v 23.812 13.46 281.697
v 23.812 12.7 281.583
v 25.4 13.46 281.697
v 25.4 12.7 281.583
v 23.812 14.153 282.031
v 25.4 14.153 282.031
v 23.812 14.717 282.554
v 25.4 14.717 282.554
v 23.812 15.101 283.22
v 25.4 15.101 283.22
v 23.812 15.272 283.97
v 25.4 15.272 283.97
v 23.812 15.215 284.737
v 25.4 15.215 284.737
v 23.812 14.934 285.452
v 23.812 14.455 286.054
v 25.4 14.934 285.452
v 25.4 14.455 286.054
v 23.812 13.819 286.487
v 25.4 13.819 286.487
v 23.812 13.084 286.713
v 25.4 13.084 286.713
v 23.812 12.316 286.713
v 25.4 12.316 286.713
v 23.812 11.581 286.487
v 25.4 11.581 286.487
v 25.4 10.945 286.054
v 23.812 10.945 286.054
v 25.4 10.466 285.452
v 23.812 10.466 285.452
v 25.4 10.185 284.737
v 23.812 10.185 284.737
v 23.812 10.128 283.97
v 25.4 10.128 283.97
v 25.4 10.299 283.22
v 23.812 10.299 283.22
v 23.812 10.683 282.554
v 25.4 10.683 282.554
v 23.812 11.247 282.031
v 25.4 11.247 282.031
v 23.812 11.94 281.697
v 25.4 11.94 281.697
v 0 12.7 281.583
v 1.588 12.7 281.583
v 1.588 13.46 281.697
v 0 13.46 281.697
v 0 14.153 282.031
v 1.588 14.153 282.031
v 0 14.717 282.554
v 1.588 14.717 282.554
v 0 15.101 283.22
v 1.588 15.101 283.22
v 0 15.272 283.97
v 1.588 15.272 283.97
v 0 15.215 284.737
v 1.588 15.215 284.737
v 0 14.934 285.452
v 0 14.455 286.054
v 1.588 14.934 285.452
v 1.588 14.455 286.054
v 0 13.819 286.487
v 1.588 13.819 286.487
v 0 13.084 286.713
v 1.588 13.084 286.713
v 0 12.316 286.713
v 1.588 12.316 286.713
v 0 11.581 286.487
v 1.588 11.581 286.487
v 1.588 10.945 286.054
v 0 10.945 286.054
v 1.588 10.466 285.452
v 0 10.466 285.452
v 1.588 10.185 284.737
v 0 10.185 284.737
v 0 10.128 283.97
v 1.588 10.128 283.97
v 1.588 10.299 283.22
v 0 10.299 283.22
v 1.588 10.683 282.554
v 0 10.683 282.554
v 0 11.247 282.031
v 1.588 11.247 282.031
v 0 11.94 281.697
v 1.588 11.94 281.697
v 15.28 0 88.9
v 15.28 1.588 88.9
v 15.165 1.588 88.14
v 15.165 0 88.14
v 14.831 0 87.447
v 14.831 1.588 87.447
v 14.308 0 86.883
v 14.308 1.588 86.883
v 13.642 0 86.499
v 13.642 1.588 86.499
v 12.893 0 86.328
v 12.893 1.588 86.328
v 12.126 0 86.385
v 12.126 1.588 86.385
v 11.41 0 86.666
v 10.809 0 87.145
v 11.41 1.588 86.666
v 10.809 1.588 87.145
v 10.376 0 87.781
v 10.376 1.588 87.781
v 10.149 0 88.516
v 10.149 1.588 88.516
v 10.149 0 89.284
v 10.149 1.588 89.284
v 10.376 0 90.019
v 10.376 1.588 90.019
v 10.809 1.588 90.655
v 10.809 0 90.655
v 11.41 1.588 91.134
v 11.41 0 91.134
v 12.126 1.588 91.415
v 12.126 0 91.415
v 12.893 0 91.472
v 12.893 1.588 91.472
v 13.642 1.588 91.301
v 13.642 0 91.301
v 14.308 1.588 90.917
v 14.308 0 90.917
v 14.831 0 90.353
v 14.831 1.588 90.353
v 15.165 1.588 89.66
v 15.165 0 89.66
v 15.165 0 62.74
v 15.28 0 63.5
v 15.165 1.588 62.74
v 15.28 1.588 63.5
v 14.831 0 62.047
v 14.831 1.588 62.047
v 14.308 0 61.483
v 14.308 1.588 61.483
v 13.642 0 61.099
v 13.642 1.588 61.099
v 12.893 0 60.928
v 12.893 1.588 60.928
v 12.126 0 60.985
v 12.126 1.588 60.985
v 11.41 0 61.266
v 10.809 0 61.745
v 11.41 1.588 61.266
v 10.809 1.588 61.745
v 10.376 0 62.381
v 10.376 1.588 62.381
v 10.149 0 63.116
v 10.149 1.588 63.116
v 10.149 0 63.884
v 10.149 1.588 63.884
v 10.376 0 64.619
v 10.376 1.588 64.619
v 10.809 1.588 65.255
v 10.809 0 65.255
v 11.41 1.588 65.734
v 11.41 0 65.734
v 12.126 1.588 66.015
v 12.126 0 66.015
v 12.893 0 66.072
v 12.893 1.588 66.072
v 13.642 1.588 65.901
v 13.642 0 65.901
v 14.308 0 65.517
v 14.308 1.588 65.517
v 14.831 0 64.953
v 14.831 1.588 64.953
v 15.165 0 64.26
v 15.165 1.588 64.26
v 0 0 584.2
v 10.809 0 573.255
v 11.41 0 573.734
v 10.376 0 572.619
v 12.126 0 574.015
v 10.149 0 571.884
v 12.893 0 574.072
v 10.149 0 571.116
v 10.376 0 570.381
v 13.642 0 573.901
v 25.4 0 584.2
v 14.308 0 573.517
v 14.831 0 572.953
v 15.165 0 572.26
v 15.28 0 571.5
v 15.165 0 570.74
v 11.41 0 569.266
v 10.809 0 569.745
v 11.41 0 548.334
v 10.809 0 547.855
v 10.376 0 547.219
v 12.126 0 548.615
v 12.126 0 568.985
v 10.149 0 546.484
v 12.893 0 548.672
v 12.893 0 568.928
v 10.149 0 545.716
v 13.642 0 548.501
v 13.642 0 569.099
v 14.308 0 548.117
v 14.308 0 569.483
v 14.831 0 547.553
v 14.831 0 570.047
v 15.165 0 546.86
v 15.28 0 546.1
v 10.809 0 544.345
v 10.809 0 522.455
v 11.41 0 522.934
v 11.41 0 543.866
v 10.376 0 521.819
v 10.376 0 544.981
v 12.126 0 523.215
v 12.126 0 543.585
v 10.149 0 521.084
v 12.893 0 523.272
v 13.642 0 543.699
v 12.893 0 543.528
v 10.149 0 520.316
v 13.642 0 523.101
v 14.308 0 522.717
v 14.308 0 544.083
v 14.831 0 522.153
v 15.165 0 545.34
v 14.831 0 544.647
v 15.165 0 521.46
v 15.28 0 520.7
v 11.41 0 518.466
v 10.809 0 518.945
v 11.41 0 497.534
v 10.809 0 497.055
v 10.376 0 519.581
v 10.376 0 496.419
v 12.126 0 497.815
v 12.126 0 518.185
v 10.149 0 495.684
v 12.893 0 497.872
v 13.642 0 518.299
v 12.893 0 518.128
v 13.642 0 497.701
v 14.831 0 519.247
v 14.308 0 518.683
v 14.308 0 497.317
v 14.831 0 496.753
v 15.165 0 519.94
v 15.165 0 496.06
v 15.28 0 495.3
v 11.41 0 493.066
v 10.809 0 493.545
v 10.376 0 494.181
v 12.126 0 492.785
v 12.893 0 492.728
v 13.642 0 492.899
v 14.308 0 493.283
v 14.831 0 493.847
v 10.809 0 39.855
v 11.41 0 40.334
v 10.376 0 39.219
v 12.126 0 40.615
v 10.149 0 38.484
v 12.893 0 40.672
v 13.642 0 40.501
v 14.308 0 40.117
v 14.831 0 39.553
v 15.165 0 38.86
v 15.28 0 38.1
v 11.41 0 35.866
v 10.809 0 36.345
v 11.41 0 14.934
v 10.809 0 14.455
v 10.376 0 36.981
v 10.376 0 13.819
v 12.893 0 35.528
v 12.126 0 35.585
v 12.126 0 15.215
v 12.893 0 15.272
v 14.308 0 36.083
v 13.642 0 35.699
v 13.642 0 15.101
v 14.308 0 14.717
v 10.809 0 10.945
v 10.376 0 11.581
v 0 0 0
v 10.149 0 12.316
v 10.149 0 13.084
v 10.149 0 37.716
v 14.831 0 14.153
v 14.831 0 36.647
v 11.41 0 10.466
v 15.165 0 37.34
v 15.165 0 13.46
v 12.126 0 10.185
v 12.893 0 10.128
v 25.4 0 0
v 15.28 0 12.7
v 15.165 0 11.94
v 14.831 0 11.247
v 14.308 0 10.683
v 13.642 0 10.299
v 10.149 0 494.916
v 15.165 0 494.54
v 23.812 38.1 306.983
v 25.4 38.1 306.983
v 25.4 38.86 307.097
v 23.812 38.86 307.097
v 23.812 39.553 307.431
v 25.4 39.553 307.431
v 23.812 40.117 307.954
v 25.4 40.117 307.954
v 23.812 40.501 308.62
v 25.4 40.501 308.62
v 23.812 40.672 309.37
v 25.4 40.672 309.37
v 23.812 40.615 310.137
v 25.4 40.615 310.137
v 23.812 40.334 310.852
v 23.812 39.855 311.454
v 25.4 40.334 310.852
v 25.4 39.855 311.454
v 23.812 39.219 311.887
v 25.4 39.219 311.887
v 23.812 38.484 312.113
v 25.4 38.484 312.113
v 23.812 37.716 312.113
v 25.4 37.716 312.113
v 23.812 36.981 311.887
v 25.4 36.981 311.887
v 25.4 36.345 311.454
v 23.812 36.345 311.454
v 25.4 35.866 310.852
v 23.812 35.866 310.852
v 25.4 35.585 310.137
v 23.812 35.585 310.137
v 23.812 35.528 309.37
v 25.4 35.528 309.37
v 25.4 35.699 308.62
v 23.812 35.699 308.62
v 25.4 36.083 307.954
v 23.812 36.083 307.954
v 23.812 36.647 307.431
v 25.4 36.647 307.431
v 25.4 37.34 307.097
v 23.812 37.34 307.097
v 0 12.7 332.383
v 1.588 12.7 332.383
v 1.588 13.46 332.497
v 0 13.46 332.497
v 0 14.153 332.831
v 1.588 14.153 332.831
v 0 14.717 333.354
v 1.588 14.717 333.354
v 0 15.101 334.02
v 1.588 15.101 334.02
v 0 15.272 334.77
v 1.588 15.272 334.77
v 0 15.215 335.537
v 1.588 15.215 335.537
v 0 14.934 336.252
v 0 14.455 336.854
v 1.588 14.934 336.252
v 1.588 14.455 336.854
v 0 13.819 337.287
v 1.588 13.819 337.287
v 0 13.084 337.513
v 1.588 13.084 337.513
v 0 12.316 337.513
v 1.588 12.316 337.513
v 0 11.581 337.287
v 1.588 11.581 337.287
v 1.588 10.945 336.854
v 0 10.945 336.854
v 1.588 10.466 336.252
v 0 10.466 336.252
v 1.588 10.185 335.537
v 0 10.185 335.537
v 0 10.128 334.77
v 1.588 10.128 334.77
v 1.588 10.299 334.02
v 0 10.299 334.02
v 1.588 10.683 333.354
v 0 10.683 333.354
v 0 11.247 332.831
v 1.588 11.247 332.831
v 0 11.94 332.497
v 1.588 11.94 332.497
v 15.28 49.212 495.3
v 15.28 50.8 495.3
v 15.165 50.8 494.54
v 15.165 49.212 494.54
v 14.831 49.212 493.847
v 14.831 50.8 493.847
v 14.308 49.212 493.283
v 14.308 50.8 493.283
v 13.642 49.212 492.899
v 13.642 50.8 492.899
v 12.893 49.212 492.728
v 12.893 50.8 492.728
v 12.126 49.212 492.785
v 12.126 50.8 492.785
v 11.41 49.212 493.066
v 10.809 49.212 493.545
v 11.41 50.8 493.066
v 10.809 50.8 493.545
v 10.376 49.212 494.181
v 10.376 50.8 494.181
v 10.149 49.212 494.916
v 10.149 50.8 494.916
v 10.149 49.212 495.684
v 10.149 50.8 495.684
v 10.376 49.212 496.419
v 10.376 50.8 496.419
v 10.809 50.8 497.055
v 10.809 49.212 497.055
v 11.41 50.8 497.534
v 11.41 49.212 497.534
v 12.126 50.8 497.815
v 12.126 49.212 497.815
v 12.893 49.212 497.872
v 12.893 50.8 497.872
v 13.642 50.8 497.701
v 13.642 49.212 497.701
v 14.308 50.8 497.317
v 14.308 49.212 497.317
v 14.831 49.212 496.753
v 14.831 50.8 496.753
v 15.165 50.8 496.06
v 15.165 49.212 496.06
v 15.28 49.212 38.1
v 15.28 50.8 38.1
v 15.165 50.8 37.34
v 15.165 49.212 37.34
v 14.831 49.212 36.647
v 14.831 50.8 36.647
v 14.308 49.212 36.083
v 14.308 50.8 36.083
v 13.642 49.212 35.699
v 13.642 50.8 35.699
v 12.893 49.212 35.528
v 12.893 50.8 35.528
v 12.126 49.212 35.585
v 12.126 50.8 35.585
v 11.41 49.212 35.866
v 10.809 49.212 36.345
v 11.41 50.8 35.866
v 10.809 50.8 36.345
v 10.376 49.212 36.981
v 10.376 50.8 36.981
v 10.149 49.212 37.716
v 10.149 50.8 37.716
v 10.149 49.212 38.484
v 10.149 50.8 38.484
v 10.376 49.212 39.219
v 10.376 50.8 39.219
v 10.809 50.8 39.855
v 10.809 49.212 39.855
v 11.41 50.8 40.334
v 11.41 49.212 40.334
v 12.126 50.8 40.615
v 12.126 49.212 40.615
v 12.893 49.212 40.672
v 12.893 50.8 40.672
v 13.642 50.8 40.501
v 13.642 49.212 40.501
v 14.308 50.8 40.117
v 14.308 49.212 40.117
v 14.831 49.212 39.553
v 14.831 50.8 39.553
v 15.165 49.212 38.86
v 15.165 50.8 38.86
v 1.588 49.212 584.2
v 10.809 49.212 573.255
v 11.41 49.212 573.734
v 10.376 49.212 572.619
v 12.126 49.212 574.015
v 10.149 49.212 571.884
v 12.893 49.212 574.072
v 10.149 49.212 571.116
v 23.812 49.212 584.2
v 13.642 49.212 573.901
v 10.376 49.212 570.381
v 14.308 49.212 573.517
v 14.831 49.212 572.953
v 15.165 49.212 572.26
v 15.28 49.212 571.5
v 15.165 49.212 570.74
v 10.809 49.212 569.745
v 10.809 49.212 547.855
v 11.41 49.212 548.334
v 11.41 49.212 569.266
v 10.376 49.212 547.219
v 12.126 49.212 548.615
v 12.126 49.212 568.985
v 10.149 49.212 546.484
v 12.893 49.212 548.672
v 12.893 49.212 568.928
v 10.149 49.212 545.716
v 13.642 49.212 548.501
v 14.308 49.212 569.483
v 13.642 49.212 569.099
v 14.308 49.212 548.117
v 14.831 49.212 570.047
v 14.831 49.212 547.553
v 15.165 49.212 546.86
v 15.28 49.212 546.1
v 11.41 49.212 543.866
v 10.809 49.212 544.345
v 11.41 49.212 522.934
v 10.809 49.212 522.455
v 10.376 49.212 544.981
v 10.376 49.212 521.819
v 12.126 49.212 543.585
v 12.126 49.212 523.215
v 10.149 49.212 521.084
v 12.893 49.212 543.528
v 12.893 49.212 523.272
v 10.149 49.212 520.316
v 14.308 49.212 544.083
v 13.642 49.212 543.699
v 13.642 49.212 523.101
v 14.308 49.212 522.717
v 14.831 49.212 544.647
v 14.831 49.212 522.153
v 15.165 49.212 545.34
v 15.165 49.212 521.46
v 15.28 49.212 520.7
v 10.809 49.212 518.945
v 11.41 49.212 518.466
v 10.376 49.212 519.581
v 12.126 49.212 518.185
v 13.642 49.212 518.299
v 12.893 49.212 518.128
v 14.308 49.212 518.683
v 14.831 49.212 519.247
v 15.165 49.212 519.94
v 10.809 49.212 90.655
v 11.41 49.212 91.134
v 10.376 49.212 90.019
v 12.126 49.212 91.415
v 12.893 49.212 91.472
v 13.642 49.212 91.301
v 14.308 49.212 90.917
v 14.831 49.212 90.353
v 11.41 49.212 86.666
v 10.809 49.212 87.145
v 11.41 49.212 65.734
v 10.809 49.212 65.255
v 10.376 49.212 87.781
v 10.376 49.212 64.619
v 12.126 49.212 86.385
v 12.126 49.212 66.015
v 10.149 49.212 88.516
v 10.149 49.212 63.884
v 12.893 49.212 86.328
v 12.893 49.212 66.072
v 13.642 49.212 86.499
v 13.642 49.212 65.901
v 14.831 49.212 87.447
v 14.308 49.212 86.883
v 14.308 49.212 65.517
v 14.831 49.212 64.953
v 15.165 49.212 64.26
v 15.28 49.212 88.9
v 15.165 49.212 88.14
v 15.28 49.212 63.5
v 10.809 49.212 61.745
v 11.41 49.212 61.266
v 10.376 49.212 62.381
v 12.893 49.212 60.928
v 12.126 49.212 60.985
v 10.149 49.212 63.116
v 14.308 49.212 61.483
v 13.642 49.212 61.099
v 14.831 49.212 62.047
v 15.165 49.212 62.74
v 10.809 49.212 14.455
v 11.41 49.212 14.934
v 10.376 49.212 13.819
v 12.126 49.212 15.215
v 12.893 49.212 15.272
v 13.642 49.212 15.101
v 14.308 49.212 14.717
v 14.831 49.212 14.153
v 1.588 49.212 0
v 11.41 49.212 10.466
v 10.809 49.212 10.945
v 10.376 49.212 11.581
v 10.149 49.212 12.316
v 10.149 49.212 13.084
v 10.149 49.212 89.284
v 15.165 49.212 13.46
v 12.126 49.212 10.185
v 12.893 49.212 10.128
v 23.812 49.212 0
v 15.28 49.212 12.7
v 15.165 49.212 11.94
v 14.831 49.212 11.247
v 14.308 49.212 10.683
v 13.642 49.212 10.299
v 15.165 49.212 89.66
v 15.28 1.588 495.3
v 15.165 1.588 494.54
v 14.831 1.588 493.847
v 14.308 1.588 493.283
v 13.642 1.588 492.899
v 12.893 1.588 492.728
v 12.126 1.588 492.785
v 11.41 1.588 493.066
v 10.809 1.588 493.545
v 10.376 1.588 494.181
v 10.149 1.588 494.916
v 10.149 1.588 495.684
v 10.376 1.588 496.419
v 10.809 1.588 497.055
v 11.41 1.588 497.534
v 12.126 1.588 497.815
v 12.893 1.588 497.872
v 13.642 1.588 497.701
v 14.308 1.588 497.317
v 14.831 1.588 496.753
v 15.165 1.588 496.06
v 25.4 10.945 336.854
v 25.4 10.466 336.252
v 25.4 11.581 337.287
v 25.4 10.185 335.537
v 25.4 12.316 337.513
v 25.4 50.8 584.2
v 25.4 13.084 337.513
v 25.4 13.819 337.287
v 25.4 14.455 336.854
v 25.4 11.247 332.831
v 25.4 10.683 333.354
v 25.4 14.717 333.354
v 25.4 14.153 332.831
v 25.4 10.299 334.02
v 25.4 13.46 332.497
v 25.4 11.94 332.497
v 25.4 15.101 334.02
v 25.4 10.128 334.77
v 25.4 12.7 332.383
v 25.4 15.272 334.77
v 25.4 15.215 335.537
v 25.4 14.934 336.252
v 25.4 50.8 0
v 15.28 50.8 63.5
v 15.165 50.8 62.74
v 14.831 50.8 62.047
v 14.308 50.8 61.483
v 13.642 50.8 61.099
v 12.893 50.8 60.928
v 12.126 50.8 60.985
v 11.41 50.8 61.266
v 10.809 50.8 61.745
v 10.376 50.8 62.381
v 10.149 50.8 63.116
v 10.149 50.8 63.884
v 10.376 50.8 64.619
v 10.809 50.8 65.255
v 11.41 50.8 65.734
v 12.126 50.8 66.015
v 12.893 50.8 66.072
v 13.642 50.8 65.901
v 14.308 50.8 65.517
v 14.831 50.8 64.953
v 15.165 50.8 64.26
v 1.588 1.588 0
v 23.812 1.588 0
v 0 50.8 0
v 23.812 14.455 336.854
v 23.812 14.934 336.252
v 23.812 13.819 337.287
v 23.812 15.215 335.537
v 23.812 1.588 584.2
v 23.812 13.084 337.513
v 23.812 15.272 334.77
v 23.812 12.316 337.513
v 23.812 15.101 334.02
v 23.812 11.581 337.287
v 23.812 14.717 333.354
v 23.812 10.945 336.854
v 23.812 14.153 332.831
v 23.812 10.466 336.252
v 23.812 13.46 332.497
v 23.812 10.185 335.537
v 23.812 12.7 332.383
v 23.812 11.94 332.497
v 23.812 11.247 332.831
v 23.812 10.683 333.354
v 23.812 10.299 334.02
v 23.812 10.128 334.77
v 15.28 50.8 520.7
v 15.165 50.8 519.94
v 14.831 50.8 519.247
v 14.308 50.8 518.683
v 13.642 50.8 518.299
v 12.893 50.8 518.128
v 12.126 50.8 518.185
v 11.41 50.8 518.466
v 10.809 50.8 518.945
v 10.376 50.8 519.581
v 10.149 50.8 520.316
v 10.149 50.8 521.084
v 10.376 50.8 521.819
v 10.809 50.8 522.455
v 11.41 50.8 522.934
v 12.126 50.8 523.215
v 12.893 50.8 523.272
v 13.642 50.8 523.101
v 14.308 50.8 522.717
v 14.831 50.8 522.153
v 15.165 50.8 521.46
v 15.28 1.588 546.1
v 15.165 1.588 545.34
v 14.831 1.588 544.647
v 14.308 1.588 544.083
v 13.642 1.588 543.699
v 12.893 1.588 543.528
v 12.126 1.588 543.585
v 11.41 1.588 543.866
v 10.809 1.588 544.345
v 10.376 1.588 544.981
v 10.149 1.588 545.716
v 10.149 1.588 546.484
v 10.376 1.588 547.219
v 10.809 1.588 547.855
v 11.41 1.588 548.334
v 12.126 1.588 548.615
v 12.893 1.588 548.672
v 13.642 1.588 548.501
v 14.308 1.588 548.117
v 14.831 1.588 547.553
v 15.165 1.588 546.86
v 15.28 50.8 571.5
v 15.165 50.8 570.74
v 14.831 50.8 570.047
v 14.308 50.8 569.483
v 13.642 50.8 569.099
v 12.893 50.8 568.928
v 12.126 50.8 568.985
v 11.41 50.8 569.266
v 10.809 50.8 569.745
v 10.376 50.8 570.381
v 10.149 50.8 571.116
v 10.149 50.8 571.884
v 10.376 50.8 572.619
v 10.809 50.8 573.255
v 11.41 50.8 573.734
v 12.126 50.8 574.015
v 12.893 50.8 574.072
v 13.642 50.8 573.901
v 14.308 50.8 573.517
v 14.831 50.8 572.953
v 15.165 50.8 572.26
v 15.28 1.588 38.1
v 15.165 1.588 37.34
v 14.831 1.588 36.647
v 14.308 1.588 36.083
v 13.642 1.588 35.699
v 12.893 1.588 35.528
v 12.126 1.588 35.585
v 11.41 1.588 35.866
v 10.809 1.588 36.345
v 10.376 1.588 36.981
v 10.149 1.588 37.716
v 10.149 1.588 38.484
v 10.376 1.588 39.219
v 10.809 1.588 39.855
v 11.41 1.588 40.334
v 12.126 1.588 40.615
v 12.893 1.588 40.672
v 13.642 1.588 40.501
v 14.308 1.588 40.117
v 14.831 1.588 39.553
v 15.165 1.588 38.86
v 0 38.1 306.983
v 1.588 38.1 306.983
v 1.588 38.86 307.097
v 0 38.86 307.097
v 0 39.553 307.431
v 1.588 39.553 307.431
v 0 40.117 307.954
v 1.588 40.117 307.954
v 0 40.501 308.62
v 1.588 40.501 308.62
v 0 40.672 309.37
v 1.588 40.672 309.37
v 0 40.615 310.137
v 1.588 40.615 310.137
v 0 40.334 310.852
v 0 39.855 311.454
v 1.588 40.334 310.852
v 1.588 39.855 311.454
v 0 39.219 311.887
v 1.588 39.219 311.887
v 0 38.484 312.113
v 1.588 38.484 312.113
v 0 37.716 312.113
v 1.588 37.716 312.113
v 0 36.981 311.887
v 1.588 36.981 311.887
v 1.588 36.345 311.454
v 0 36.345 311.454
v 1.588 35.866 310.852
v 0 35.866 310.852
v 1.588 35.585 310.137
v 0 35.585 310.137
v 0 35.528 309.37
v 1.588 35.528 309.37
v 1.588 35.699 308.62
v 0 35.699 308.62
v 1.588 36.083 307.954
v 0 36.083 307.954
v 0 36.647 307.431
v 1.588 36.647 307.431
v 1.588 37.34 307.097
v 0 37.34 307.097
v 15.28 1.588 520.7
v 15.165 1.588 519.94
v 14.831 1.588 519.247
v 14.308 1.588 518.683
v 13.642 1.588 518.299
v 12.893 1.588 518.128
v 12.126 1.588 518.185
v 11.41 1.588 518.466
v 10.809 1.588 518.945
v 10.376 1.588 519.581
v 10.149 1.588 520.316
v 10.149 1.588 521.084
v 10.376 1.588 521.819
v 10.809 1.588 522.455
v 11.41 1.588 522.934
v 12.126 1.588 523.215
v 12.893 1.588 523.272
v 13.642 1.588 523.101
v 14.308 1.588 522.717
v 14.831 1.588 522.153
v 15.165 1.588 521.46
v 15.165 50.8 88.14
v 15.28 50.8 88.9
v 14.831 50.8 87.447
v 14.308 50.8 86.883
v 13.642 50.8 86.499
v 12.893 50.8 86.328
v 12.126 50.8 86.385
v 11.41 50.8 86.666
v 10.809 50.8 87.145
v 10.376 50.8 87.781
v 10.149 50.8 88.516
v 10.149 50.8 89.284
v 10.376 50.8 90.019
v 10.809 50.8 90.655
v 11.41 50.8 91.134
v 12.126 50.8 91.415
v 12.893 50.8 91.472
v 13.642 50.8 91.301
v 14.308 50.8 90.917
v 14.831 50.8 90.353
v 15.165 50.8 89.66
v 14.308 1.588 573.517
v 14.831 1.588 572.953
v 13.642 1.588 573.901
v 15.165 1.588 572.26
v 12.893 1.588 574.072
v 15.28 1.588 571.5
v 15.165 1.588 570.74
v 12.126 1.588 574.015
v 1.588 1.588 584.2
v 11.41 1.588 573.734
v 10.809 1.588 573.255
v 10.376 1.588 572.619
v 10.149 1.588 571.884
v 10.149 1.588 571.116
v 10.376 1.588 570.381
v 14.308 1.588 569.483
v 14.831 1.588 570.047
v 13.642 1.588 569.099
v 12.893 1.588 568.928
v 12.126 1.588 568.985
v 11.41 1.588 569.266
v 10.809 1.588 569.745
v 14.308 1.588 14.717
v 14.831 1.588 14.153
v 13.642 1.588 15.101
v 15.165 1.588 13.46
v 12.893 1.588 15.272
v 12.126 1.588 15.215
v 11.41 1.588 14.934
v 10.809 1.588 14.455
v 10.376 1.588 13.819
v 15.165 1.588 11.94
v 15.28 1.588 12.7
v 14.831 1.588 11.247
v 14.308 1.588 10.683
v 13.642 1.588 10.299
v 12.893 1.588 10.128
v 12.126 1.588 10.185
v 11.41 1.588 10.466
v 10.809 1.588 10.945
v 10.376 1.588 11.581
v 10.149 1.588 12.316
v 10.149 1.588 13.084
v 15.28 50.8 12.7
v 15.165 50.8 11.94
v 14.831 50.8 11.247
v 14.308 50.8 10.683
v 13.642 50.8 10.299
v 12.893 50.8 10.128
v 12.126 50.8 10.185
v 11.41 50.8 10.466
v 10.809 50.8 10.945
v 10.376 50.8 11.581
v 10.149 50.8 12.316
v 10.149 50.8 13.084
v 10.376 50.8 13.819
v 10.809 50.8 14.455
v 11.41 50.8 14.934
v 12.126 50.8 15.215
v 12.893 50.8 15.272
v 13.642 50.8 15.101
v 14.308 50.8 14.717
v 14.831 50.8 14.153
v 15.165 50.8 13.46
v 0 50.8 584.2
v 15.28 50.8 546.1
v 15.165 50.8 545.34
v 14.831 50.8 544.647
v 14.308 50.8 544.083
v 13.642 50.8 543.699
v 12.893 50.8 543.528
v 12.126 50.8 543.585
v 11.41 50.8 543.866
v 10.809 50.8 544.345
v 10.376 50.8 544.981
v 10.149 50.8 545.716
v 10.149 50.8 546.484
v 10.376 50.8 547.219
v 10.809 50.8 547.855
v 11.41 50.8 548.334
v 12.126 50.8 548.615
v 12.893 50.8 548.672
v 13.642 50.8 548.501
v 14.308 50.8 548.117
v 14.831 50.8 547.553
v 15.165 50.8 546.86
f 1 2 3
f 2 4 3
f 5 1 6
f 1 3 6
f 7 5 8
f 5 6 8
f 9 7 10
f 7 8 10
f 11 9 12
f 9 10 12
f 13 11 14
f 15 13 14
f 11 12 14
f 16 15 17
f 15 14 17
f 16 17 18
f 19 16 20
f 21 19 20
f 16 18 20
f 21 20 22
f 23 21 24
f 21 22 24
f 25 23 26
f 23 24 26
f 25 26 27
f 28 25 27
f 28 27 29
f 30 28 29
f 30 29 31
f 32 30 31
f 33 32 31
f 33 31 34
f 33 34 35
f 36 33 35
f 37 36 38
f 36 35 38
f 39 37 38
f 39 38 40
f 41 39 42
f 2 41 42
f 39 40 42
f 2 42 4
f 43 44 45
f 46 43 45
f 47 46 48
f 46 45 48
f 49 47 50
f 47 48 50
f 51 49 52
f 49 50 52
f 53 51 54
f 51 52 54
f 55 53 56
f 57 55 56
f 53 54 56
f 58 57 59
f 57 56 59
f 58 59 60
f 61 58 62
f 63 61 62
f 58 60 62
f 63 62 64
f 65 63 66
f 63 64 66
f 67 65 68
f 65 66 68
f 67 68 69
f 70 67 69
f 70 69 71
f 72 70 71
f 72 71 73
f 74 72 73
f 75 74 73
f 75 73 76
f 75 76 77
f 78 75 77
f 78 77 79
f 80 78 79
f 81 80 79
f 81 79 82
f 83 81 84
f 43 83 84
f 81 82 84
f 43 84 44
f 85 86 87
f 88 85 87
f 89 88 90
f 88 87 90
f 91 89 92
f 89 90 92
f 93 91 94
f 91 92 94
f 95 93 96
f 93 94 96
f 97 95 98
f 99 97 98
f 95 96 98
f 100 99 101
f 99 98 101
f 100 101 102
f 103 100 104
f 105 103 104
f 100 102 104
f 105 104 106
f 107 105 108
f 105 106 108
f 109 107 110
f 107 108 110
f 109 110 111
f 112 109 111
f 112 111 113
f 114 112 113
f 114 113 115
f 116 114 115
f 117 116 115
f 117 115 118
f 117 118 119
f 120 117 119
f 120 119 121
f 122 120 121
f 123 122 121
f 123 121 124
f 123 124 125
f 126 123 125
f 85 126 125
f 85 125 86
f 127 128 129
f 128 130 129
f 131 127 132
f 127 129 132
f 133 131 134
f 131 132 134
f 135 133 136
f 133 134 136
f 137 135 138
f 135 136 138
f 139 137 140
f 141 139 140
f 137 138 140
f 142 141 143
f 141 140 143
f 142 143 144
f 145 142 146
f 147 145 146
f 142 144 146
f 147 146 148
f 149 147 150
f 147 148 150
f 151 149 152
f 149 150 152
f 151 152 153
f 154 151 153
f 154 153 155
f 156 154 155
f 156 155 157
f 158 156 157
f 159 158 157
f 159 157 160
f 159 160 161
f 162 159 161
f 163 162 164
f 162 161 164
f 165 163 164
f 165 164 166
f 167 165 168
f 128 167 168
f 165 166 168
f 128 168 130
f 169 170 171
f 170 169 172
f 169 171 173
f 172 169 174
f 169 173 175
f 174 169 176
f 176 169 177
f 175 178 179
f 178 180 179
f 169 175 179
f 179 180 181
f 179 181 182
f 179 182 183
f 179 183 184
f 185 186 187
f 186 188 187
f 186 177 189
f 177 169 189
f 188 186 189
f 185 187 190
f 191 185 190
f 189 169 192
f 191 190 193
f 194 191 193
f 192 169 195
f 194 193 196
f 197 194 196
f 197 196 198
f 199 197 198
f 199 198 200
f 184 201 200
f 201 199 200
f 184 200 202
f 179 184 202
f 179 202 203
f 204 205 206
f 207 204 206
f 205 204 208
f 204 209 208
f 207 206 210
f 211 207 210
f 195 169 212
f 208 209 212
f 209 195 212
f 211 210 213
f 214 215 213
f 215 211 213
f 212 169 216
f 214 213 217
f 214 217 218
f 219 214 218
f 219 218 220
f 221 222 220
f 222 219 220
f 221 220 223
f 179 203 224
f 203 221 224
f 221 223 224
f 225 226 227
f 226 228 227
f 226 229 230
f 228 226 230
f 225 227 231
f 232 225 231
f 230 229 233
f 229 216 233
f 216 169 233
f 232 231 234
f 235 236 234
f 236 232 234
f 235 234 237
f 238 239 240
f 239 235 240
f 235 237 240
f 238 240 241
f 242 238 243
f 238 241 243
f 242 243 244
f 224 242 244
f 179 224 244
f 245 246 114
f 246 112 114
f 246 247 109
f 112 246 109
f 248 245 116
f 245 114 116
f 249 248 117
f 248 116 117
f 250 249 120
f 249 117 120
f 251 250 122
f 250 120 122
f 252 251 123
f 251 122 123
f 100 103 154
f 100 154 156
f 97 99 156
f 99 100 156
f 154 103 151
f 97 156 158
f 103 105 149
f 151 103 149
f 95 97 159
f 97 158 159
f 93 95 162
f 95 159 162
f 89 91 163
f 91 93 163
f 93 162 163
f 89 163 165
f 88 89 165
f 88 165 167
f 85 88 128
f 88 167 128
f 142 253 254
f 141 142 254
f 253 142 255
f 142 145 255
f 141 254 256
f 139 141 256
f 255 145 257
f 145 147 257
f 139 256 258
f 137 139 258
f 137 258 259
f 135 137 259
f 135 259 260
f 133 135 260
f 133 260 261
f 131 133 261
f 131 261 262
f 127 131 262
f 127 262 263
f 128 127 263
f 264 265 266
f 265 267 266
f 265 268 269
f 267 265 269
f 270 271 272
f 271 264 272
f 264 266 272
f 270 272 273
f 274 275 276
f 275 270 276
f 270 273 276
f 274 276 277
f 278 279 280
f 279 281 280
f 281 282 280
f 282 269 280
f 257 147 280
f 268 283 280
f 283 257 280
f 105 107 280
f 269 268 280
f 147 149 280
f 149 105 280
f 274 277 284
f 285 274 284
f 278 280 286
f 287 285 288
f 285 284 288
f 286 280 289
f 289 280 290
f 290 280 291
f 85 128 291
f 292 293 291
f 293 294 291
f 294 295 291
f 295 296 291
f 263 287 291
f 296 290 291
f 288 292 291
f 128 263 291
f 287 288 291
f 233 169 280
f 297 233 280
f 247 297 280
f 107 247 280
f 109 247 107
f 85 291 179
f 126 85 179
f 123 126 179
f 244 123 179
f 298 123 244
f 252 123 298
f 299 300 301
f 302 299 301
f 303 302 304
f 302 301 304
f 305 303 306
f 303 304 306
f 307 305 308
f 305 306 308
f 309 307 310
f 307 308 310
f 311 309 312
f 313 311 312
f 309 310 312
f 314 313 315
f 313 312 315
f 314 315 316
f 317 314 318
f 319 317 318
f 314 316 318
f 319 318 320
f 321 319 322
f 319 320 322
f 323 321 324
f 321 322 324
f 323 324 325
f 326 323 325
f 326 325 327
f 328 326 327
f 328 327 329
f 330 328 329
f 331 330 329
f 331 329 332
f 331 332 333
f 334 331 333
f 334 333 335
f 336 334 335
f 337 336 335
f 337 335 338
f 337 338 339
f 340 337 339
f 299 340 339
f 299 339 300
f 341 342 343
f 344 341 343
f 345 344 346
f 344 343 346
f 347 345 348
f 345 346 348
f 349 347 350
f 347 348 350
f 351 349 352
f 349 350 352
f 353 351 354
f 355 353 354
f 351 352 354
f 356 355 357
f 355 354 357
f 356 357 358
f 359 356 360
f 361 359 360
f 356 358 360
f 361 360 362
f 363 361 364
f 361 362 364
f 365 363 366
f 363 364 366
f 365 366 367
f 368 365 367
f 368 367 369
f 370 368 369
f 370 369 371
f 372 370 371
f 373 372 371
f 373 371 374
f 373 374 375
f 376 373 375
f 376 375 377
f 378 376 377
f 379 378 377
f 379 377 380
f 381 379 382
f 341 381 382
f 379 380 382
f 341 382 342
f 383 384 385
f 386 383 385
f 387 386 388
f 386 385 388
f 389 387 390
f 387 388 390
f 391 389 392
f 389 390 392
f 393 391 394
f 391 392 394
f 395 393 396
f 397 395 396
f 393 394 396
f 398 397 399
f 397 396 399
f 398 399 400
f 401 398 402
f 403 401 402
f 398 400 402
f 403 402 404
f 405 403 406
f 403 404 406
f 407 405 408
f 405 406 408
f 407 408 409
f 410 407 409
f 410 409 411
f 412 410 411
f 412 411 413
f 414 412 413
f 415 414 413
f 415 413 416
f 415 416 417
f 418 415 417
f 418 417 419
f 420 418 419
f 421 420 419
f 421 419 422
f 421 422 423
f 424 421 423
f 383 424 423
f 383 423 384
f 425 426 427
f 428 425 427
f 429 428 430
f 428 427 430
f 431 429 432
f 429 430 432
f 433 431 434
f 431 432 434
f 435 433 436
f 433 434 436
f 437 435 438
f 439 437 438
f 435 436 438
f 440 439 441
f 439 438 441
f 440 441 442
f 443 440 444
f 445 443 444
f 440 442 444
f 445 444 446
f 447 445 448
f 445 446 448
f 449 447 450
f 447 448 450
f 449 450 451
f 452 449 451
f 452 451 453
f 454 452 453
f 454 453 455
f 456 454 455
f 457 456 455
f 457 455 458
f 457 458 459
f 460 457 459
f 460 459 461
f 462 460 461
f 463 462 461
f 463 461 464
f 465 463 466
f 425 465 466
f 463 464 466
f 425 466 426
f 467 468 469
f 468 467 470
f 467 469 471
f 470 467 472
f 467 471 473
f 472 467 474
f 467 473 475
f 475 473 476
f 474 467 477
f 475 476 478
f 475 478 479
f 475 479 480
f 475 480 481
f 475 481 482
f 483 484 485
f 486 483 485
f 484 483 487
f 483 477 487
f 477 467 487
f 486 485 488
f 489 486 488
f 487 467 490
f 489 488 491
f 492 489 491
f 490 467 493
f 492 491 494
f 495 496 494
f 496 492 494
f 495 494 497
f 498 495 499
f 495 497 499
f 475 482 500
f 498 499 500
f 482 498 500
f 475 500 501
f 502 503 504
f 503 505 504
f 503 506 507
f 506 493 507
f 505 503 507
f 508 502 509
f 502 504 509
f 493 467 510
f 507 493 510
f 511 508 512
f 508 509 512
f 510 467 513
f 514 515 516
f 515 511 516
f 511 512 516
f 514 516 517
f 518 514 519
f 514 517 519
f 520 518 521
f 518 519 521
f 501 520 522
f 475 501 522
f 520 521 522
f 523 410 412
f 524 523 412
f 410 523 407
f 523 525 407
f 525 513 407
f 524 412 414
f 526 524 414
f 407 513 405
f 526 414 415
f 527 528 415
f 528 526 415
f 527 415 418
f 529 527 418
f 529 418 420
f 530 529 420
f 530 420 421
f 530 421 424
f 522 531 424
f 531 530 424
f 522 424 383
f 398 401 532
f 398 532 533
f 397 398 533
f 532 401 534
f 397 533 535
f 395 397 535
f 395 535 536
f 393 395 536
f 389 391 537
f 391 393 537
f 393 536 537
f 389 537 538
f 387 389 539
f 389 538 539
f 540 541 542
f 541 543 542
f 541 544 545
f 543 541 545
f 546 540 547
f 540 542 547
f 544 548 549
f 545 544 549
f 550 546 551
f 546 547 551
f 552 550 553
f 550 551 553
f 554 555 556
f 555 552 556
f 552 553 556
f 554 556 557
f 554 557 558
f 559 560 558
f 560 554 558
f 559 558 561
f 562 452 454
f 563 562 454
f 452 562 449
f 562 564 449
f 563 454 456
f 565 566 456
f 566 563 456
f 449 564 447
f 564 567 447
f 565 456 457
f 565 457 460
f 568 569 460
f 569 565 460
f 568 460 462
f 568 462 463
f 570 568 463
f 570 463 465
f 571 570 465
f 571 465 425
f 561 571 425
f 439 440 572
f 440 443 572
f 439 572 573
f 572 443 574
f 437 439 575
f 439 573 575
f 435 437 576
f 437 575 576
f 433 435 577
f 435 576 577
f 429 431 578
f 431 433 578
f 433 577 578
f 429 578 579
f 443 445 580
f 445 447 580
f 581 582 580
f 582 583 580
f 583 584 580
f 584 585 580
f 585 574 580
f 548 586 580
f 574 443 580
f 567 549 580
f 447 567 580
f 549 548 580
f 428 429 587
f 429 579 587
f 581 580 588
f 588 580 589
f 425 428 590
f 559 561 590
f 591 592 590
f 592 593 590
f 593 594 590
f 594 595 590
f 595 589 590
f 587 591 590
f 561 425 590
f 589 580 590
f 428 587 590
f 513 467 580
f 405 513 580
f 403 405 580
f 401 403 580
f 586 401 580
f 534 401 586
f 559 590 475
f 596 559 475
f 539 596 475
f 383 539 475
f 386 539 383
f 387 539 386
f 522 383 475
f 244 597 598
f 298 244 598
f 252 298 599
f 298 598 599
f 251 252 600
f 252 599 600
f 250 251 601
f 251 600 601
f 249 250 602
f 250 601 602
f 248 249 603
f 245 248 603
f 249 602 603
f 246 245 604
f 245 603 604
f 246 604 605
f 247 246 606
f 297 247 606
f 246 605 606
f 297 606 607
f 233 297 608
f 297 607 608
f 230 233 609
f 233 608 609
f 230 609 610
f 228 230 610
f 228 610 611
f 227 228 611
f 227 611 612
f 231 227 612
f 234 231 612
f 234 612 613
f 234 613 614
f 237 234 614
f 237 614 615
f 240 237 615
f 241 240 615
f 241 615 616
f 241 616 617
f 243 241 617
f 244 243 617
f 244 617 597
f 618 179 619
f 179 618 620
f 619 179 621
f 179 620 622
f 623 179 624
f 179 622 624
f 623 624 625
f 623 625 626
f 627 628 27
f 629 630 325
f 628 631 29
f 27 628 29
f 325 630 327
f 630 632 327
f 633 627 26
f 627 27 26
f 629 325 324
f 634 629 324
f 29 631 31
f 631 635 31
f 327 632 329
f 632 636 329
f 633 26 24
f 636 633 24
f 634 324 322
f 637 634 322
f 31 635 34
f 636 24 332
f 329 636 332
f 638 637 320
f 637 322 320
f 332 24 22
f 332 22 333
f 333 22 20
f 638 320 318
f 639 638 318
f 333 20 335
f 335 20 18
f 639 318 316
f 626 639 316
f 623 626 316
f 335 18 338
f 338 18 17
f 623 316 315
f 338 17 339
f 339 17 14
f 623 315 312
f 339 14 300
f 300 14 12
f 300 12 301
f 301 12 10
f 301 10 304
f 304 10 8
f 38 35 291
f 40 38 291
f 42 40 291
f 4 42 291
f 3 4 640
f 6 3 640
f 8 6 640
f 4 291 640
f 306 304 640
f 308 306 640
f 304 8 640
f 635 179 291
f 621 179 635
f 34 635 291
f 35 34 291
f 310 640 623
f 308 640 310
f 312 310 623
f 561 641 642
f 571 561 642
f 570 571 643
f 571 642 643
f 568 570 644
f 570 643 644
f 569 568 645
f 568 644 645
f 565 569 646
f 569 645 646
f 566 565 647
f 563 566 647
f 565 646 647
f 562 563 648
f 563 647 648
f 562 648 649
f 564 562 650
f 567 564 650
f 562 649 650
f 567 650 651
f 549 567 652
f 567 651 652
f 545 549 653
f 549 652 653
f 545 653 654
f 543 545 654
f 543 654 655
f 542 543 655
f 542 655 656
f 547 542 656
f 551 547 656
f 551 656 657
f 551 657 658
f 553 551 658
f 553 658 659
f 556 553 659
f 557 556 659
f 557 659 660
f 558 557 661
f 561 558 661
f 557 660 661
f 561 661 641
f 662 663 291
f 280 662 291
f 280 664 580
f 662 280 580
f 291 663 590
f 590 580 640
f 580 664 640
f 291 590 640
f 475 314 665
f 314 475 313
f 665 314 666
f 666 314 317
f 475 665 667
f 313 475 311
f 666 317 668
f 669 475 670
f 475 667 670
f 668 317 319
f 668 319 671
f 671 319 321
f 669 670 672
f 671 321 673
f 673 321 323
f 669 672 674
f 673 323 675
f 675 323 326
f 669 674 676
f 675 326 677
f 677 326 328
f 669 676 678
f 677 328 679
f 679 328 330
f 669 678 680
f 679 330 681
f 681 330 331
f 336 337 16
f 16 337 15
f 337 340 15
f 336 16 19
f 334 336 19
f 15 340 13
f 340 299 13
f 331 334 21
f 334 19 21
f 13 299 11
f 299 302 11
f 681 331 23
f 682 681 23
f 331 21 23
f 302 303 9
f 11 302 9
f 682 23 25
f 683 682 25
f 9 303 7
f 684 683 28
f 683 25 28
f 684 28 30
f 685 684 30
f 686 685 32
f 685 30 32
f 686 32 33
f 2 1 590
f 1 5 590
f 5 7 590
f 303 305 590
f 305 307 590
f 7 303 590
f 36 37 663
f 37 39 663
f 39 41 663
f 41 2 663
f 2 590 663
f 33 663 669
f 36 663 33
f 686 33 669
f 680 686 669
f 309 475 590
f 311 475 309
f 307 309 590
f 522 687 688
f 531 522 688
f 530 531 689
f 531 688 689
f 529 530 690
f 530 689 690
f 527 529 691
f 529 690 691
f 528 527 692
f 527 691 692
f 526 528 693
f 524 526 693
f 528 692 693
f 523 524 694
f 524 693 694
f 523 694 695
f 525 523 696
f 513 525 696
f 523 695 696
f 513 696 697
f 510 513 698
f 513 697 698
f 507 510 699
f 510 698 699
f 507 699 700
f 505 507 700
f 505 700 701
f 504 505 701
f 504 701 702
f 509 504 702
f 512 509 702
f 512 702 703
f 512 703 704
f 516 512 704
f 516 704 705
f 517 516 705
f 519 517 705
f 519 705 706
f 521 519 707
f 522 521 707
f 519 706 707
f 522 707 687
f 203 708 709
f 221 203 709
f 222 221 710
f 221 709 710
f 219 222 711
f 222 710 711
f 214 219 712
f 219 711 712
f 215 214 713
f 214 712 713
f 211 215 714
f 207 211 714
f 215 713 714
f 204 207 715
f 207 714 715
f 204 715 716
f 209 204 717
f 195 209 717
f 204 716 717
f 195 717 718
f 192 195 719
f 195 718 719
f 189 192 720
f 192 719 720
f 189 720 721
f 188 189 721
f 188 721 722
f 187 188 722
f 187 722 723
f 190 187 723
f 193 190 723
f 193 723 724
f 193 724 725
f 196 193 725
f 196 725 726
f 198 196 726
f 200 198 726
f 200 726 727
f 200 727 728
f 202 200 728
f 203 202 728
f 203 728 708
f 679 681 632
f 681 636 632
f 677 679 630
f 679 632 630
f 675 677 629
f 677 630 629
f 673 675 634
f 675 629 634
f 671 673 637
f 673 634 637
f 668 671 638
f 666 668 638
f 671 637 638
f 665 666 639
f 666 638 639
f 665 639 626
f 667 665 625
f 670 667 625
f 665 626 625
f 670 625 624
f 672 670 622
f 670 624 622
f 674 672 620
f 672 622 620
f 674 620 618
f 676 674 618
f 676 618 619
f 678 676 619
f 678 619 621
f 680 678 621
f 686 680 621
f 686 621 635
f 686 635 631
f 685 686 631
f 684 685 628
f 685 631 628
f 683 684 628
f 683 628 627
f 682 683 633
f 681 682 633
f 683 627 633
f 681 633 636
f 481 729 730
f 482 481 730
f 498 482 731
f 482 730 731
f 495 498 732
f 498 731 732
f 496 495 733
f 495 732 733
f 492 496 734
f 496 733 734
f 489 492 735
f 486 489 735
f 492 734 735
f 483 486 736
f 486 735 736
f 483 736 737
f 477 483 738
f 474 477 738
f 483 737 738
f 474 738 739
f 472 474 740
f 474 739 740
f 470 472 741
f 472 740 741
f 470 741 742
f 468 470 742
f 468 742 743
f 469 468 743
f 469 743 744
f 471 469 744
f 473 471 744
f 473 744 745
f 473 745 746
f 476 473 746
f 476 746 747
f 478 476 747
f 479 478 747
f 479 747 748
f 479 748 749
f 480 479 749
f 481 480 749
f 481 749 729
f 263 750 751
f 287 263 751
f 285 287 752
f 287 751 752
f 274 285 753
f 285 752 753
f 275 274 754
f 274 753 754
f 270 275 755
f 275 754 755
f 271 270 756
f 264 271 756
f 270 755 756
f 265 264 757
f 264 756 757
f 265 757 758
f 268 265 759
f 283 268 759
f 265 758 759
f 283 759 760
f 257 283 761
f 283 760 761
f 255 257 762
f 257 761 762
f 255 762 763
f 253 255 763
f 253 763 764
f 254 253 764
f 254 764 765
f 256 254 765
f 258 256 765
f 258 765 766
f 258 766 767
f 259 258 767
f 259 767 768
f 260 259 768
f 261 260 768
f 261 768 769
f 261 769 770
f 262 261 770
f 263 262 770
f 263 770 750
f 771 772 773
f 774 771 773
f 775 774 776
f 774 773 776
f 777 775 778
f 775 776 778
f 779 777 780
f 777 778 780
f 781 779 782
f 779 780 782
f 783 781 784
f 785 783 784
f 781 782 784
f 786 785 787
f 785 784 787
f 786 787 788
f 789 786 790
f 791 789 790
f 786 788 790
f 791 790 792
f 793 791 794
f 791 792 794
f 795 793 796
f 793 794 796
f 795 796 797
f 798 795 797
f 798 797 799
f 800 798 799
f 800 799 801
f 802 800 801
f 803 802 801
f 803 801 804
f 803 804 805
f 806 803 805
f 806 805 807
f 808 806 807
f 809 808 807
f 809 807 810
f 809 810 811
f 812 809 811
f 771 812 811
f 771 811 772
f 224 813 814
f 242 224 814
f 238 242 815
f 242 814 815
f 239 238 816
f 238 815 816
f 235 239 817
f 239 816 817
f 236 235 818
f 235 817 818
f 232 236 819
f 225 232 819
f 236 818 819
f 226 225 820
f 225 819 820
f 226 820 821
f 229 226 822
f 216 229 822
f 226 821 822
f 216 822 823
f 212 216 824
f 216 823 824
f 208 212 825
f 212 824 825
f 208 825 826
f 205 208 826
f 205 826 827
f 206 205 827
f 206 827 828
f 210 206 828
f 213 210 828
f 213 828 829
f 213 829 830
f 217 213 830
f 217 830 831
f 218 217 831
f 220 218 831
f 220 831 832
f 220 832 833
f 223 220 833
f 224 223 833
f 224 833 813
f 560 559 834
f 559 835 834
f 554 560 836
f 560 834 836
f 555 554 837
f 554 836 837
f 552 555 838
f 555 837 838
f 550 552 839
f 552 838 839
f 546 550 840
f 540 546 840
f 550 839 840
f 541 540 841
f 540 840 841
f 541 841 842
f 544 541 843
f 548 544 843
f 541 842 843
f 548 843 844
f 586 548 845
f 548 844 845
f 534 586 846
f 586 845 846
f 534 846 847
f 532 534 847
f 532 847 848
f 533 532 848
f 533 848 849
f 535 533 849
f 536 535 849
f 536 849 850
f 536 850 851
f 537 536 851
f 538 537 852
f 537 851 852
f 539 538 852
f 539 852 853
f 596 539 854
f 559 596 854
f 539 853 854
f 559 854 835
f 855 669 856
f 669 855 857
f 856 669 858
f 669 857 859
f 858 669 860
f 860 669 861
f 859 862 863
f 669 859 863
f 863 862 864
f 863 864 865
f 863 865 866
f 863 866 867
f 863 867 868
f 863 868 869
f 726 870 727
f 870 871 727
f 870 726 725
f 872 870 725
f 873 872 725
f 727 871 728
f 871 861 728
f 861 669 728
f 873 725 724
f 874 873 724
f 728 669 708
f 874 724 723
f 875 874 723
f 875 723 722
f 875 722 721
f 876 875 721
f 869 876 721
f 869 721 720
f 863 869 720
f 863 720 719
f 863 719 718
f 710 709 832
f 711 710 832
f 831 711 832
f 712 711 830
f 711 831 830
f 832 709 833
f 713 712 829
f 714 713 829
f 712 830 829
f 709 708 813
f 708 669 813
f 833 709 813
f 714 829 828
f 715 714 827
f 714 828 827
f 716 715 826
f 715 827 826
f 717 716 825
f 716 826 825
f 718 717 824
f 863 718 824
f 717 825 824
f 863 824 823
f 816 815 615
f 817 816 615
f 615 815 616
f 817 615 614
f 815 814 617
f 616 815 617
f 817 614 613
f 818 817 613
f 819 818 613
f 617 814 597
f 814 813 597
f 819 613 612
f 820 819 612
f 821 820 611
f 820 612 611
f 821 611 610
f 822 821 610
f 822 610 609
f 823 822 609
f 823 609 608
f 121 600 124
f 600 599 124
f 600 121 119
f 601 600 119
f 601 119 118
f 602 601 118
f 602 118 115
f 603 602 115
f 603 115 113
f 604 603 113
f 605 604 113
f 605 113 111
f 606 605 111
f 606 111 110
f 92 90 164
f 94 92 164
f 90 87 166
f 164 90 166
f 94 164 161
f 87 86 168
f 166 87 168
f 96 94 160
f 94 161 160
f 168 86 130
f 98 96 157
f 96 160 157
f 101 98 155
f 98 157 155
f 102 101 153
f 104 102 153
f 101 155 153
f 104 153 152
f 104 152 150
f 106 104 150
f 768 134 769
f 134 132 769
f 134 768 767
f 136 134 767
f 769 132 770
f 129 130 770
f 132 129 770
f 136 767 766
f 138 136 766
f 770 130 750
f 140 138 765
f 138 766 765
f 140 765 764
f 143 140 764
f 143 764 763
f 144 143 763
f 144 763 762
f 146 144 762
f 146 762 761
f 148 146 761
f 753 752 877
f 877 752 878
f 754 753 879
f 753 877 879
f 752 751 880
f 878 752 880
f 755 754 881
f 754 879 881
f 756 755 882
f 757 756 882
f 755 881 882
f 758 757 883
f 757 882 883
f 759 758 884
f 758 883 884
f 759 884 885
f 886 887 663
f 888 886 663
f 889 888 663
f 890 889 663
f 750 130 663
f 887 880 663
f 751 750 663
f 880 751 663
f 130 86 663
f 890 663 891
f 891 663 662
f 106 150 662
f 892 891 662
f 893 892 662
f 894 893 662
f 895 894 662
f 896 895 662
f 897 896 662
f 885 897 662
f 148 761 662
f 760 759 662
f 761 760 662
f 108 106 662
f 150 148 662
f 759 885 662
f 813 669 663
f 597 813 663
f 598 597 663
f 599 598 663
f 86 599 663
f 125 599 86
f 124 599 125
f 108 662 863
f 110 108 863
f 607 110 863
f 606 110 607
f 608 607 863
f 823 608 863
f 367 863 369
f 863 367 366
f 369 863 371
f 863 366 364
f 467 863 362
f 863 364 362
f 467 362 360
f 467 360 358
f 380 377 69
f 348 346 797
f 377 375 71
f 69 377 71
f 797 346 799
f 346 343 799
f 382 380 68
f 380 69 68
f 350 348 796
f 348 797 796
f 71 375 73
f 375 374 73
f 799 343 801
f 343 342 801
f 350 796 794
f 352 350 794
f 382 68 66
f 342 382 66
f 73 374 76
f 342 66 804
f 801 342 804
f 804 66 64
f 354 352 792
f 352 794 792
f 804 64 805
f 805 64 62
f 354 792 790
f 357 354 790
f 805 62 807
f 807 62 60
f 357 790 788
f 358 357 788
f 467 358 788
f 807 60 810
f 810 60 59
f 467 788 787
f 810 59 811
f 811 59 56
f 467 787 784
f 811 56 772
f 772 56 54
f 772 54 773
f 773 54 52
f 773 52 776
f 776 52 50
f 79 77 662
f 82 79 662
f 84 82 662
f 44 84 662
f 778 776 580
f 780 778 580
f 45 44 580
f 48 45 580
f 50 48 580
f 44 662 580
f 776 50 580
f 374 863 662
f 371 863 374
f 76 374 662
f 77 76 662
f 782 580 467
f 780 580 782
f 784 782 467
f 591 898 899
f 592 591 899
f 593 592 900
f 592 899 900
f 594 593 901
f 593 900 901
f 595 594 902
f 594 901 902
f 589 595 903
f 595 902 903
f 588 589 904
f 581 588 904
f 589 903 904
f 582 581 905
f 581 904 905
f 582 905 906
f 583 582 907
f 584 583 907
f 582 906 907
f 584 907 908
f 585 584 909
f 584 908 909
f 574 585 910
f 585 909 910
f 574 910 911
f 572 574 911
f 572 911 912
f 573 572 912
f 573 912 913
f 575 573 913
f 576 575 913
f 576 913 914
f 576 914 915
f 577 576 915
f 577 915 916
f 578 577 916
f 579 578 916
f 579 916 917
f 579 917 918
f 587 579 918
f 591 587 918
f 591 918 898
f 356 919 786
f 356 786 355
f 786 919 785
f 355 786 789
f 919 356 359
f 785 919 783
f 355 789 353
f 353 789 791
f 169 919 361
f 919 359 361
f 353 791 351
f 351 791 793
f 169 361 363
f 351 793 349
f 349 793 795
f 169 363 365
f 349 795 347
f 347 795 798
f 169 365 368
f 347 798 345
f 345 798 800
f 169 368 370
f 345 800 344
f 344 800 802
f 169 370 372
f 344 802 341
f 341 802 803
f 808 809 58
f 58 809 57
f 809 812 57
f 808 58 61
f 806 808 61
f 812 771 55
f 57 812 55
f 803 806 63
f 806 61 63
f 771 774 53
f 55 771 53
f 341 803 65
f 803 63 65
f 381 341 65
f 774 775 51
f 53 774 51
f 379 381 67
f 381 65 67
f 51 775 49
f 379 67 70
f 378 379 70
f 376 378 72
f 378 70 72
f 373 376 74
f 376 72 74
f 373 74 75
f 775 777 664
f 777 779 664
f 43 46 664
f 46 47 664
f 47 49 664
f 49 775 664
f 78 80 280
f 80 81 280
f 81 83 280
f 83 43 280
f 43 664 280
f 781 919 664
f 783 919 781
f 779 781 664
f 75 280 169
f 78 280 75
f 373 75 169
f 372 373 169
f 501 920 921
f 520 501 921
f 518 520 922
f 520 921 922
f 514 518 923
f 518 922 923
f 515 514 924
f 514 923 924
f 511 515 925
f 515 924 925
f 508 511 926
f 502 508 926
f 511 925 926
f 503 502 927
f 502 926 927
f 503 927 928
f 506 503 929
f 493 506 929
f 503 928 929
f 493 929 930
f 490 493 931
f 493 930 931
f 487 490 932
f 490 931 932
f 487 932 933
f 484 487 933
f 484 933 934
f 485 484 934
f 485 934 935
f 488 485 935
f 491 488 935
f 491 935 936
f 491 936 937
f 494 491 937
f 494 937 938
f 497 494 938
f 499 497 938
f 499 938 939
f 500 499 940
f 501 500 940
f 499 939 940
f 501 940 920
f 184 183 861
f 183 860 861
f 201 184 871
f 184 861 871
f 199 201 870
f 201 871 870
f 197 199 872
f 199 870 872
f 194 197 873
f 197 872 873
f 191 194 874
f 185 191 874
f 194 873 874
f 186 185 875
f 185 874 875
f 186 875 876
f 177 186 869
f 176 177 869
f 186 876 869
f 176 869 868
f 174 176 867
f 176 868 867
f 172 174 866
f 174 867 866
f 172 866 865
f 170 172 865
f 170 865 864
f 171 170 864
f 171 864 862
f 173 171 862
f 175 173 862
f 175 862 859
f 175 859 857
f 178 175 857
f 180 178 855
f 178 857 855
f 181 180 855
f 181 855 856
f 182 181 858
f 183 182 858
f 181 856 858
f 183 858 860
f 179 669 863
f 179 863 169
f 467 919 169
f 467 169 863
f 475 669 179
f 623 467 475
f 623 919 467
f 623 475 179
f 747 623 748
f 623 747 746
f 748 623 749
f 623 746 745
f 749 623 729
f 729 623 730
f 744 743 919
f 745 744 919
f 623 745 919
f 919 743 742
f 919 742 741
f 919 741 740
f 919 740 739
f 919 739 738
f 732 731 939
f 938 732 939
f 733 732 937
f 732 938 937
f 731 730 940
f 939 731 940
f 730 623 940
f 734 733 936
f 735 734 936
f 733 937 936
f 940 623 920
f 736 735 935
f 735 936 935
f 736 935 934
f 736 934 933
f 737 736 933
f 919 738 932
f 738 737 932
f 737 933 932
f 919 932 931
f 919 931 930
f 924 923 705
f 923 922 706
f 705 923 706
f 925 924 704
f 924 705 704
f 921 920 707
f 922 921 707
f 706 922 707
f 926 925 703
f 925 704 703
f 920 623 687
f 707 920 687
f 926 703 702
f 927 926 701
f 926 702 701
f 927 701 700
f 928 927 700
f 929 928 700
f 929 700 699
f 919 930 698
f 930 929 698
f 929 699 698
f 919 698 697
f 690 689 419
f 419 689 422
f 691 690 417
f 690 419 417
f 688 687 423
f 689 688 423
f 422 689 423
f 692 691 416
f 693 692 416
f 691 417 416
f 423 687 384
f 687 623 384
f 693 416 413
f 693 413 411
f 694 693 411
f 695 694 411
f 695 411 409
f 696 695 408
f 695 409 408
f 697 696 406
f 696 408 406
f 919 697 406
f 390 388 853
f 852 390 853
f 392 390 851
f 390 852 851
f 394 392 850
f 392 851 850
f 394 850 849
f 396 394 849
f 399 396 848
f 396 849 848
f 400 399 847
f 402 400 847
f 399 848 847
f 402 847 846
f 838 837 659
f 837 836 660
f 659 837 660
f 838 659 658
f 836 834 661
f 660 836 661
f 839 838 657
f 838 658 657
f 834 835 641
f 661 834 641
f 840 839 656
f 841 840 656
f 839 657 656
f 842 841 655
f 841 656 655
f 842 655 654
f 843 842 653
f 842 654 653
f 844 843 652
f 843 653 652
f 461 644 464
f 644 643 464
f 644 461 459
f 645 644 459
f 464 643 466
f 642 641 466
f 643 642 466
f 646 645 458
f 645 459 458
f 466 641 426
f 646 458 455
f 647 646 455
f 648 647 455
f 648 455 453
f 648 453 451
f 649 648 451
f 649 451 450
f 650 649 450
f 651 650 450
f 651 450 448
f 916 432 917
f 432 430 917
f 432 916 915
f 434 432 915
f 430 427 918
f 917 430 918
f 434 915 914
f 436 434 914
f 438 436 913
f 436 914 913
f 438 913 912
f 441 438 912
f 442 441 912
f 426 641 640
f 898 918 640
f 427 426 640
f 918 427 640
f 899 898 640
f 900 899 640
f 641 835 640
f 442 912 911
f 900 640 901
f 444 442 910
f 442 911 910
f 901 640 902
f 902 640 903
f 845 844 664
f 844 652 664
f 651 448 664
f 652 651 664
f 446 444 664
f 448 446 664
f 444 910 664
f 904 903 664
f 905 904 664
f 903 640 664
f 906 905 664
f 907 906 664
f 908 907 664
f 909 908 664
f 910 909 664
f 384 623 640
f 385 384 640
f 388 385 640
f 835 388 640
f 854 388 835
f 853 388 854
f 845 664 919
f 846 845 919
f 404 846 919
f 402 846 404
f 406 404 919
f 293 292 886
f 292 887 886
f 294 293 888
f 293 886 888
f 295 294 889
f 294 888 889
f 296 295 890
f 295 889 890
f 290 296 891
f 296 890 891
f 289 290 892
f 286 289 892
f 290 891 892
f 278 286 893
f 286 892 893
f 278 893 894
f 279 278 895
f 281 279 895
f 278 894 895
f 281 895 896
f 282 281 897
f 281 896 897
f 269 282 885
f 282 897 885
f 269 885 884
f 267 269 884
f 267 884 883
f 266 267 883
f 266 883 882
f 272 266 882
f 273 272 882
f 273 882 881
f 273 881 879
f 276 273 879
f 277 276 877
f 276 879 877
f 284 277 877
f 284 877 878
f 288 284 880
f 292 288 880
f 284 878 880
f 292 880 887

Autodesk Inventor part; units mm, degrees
ref_plane "YZ Plane" through (0, 0, 0) normal (1, 0, 0) x (0, 1, 0)
ref_plane "XZ Plane" through (0, 0, 0) normal (0, 1, 0) x (-1, 0, 0)
ref_plane "XY Plane" through (0, 0, 0) normal (0, 0, 1) x (1, 0, 0)
sketch "Sketch1" plane through (0, 0, 0) normal (0, 0, 1) x (1, 0, 0)
  line L0 (0, 0) -> (25.4, 0)
  line L1 (25.4, 0) -> (25.4, 50.8)
  line L2 (25.4, 50.8) -> (0, 50.8)
  line L3 (0, 50.8) -> (0, 0)
  line L4 (23.8125, 1.5875) -> (1.5875, 1.5875)
  line L5 (1.5875, 1.5875) -> (1.5875, 49.2125)
  line L6 (1.5875, 49.2125) -> (23.8125, 49.2125)
  line L7 (23.8125, 49.2125) -> (23.8125, 1.5875)
  dimension "d0" = 25.4
  dimension "d1" = 50.8
  dimension "d2" = 1.5875
extrude "Extrusion1" add sketch "Sketch1" along normal blind 584.2
sketch "Sketch2" plane through (0, 50.8, 0) normal (0, 1, 0) x (1, 0, 0)
  line L0 (23.8125, 0) -> (1.5875, 0) construction
  line L1 (12.7, 0) -> (12.7, -12.7) construction
  line L2 (25.4, -584.2) -> (0, -584.2) construction
  line L3 (12.7, -584.2) -> (12.7, -571.5) construction
  circle A0 centre (12.7, -571.5) radius 2.5797
  circle A1 centre (12.7, -12.7) radius 2.5797
  point P0 (0, 0)
  dimension "d5" = 12.7
  dimension "d6" = 12.7
  dimension "d7" = 5.1594
extrude "Extrusion2" cut sketch "Sketch2" against normal blind 711.2
sketch "Sketch3" plane through (0, 50.8, 0) normal (0, 1, 0) x (1, 0, 0)
  circle A0 centre (12.7, -12.7) radius 2.5797 construction
  line L0 (12.7, -12.7) -> (12.7, -38.1) construction
  circle A1 centre (12.7, -38.1) radius 2.5797
  circle A2 centre (12.7, -571.5) radius 2.5797 construction
  line L1 (12.7, -571.5) -> (12.7, -546.1) construction
  circle A3 centre (12.7, -546.1) radius 2.5797
  point P0 (0, 0)
  dimension "d10" = 25.4
  dimension "d13" = 25.4
extrude "Extrusion4" cut sketch "Sketch3" against normal blind 68.2625
sketch "Sketch4" plane through (25.4, 0, 0) normal (1, 0, 0) x (0, 0, -1)
  line L0 (0, 0) -> (-584.2, 0) construction
  line L1 (0, 0) -> (-284.1625, 0) construction
  line L2 (-284.1625, 0) -> (-334.9625, 0) construction
  line L3 (-334.9625, 0) -> (-334.9625, 12.7) construction
  line L4 (-334.9625, 12.7) -> (-309.5625, 12.7) construction
  line L5 (-309.5625, 12.7) -> (-309.5625, 38.1) construction
  line L6 (-309.5625, 12.7) -> (-284.1625, 12.7) construction
  circle A0 centre (-284.1625, 12.7) radius 2.5797
  circle A1 centre (-334.9625, 12.7) radius 2.5797
  circle A2 centre (-309.5625, 38.1) radius 2.5797
  dimension "d16" = 284.1625
  dimension "d17" = 50.8
  dimension "d18" = 12.7
  dimension "d19" = 25.4
  dimension "d20" = 25.4
  dimension "d21" = 5.1594
  dimension "d22" = 5.1594
extrude "Extrusion5" cut sketch "Sketch4" against normal blind 25.4
sketch "Sketch5" plane through (0, 50.8, 0) normal (0, 1, 0) x (1, 0, 0)
  circle A0 centre (12.7, -38.1) radius 2.5797 construction
  line L0 (12.7, -38.1) -> (12.7, -63.5) construction
  circle A1 centre (12.7, -546.1) radius 2.5797 construction
  line L1 (12.7, -546.1) -> (12.7, -520.7) construction
  circle A2 centre (12.7, -520.7) radius 2.5797
  circle A3 centre (12.7, -63.5) radius 2.5797
  line L2 (12.7, -520.7) -> (12.7, -495.3) construction
  line L3 (12.7, -63.5) -> (12.7, -88.9) construction
  circle A4 centre (12.7, -88.9) radius 2.5797
  circle A5 centre (12.7, -495.3) radius 2.5797
  point P0 (0, 0)
  dimension "d25" = 25.4
  dimension "d26" = 25.4
  dimension "d29" = 25.4
  dimension "d30" = 25.4
extrude "Extrusion7" cut sketch "Sketch5" against normal blind 77.7875
properties part number "1x2 28in"
